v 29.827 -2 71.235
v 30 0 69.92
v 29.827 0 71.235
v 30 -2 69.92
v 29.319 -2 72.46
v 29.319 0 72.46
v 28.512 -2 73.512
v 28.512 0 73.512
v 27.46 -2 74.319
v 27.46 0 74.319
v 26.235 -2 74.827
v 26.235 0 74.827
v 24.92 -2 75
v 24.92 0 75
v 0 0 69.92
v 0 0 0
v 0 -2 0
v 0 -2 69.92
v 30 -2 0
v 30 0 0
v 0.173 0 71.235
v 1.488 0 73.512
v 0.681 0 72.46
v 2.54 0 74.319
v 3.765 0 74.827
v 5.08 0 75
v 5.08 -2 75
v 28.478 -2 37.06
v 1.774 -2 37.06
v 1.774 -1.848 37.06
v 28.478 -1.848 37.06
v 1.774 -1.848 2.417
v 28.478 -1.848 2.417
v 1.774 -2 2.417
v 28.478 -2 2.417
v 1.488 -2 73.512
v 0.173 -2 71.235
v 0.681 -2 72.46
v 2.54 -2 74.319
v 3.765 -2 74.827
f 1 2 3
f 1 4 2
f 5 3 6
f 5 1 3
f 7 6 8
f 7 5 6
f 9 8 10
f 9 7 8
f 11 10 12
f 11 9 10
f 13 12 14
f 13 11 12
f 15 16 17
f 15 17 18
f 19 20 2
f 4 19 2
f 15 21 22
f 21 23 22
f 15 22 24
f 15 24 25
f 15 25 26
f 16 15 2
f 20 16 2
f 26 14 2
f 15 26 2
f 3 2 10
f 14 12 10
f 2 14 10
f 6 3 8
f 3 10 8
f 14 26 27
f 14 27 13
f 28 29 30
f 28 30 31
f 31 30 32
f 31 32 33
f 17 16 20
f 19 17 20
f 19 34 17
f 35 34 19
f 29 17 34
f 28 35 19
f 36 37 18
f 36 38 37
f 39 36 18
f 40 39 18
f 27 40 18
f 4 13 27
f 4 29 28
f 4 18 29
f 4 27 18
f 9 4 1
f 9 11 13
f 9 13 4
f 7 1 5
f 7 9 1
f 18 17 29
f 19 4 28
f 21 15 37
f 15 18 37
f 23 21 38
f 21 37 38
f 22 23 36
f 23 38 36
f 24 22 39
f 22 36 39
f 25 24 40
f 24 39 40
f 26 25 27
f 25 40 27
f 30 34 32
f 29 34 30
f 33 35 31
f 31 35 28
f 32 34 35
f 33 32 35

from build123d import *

# Parameters (mm, degrees)
F0_W     = 30
F0_H     = 75
F1_DEPTH = 2
F2_R     = 5.08
F3_W     = 26.70412
F3_H     = 34.643184
F4_DEPTH = 0.1524


with BuildPart() as f1:
    # F0 (on Front) → F1 (new body)
    with BuildSketch(Plane.XZ):
        with Locations((15, 37.5)):
            Rectangle(F0_W, F0_H)
    extrude(amount=F1_DEPTH)

    # F2
    f2_edges = [f1.edges().sort_by_distance(p)[0] for p in [
        (30, -1, 75),
        (0, -1, 75),
    ]]
    fillet(f2_edges, radius=F2_R)

    # F3 (on face) → F4 (cut)
    with BuildSketch(Plane.XZ.offset(2)):
        with Locations((15.126201, 19.738285)):
            Rectangle(F3_W, F3_H)
    extrude(amount=-F4_DEPTH, mode=Mode.SUBTRACT)


solid = f1.part
